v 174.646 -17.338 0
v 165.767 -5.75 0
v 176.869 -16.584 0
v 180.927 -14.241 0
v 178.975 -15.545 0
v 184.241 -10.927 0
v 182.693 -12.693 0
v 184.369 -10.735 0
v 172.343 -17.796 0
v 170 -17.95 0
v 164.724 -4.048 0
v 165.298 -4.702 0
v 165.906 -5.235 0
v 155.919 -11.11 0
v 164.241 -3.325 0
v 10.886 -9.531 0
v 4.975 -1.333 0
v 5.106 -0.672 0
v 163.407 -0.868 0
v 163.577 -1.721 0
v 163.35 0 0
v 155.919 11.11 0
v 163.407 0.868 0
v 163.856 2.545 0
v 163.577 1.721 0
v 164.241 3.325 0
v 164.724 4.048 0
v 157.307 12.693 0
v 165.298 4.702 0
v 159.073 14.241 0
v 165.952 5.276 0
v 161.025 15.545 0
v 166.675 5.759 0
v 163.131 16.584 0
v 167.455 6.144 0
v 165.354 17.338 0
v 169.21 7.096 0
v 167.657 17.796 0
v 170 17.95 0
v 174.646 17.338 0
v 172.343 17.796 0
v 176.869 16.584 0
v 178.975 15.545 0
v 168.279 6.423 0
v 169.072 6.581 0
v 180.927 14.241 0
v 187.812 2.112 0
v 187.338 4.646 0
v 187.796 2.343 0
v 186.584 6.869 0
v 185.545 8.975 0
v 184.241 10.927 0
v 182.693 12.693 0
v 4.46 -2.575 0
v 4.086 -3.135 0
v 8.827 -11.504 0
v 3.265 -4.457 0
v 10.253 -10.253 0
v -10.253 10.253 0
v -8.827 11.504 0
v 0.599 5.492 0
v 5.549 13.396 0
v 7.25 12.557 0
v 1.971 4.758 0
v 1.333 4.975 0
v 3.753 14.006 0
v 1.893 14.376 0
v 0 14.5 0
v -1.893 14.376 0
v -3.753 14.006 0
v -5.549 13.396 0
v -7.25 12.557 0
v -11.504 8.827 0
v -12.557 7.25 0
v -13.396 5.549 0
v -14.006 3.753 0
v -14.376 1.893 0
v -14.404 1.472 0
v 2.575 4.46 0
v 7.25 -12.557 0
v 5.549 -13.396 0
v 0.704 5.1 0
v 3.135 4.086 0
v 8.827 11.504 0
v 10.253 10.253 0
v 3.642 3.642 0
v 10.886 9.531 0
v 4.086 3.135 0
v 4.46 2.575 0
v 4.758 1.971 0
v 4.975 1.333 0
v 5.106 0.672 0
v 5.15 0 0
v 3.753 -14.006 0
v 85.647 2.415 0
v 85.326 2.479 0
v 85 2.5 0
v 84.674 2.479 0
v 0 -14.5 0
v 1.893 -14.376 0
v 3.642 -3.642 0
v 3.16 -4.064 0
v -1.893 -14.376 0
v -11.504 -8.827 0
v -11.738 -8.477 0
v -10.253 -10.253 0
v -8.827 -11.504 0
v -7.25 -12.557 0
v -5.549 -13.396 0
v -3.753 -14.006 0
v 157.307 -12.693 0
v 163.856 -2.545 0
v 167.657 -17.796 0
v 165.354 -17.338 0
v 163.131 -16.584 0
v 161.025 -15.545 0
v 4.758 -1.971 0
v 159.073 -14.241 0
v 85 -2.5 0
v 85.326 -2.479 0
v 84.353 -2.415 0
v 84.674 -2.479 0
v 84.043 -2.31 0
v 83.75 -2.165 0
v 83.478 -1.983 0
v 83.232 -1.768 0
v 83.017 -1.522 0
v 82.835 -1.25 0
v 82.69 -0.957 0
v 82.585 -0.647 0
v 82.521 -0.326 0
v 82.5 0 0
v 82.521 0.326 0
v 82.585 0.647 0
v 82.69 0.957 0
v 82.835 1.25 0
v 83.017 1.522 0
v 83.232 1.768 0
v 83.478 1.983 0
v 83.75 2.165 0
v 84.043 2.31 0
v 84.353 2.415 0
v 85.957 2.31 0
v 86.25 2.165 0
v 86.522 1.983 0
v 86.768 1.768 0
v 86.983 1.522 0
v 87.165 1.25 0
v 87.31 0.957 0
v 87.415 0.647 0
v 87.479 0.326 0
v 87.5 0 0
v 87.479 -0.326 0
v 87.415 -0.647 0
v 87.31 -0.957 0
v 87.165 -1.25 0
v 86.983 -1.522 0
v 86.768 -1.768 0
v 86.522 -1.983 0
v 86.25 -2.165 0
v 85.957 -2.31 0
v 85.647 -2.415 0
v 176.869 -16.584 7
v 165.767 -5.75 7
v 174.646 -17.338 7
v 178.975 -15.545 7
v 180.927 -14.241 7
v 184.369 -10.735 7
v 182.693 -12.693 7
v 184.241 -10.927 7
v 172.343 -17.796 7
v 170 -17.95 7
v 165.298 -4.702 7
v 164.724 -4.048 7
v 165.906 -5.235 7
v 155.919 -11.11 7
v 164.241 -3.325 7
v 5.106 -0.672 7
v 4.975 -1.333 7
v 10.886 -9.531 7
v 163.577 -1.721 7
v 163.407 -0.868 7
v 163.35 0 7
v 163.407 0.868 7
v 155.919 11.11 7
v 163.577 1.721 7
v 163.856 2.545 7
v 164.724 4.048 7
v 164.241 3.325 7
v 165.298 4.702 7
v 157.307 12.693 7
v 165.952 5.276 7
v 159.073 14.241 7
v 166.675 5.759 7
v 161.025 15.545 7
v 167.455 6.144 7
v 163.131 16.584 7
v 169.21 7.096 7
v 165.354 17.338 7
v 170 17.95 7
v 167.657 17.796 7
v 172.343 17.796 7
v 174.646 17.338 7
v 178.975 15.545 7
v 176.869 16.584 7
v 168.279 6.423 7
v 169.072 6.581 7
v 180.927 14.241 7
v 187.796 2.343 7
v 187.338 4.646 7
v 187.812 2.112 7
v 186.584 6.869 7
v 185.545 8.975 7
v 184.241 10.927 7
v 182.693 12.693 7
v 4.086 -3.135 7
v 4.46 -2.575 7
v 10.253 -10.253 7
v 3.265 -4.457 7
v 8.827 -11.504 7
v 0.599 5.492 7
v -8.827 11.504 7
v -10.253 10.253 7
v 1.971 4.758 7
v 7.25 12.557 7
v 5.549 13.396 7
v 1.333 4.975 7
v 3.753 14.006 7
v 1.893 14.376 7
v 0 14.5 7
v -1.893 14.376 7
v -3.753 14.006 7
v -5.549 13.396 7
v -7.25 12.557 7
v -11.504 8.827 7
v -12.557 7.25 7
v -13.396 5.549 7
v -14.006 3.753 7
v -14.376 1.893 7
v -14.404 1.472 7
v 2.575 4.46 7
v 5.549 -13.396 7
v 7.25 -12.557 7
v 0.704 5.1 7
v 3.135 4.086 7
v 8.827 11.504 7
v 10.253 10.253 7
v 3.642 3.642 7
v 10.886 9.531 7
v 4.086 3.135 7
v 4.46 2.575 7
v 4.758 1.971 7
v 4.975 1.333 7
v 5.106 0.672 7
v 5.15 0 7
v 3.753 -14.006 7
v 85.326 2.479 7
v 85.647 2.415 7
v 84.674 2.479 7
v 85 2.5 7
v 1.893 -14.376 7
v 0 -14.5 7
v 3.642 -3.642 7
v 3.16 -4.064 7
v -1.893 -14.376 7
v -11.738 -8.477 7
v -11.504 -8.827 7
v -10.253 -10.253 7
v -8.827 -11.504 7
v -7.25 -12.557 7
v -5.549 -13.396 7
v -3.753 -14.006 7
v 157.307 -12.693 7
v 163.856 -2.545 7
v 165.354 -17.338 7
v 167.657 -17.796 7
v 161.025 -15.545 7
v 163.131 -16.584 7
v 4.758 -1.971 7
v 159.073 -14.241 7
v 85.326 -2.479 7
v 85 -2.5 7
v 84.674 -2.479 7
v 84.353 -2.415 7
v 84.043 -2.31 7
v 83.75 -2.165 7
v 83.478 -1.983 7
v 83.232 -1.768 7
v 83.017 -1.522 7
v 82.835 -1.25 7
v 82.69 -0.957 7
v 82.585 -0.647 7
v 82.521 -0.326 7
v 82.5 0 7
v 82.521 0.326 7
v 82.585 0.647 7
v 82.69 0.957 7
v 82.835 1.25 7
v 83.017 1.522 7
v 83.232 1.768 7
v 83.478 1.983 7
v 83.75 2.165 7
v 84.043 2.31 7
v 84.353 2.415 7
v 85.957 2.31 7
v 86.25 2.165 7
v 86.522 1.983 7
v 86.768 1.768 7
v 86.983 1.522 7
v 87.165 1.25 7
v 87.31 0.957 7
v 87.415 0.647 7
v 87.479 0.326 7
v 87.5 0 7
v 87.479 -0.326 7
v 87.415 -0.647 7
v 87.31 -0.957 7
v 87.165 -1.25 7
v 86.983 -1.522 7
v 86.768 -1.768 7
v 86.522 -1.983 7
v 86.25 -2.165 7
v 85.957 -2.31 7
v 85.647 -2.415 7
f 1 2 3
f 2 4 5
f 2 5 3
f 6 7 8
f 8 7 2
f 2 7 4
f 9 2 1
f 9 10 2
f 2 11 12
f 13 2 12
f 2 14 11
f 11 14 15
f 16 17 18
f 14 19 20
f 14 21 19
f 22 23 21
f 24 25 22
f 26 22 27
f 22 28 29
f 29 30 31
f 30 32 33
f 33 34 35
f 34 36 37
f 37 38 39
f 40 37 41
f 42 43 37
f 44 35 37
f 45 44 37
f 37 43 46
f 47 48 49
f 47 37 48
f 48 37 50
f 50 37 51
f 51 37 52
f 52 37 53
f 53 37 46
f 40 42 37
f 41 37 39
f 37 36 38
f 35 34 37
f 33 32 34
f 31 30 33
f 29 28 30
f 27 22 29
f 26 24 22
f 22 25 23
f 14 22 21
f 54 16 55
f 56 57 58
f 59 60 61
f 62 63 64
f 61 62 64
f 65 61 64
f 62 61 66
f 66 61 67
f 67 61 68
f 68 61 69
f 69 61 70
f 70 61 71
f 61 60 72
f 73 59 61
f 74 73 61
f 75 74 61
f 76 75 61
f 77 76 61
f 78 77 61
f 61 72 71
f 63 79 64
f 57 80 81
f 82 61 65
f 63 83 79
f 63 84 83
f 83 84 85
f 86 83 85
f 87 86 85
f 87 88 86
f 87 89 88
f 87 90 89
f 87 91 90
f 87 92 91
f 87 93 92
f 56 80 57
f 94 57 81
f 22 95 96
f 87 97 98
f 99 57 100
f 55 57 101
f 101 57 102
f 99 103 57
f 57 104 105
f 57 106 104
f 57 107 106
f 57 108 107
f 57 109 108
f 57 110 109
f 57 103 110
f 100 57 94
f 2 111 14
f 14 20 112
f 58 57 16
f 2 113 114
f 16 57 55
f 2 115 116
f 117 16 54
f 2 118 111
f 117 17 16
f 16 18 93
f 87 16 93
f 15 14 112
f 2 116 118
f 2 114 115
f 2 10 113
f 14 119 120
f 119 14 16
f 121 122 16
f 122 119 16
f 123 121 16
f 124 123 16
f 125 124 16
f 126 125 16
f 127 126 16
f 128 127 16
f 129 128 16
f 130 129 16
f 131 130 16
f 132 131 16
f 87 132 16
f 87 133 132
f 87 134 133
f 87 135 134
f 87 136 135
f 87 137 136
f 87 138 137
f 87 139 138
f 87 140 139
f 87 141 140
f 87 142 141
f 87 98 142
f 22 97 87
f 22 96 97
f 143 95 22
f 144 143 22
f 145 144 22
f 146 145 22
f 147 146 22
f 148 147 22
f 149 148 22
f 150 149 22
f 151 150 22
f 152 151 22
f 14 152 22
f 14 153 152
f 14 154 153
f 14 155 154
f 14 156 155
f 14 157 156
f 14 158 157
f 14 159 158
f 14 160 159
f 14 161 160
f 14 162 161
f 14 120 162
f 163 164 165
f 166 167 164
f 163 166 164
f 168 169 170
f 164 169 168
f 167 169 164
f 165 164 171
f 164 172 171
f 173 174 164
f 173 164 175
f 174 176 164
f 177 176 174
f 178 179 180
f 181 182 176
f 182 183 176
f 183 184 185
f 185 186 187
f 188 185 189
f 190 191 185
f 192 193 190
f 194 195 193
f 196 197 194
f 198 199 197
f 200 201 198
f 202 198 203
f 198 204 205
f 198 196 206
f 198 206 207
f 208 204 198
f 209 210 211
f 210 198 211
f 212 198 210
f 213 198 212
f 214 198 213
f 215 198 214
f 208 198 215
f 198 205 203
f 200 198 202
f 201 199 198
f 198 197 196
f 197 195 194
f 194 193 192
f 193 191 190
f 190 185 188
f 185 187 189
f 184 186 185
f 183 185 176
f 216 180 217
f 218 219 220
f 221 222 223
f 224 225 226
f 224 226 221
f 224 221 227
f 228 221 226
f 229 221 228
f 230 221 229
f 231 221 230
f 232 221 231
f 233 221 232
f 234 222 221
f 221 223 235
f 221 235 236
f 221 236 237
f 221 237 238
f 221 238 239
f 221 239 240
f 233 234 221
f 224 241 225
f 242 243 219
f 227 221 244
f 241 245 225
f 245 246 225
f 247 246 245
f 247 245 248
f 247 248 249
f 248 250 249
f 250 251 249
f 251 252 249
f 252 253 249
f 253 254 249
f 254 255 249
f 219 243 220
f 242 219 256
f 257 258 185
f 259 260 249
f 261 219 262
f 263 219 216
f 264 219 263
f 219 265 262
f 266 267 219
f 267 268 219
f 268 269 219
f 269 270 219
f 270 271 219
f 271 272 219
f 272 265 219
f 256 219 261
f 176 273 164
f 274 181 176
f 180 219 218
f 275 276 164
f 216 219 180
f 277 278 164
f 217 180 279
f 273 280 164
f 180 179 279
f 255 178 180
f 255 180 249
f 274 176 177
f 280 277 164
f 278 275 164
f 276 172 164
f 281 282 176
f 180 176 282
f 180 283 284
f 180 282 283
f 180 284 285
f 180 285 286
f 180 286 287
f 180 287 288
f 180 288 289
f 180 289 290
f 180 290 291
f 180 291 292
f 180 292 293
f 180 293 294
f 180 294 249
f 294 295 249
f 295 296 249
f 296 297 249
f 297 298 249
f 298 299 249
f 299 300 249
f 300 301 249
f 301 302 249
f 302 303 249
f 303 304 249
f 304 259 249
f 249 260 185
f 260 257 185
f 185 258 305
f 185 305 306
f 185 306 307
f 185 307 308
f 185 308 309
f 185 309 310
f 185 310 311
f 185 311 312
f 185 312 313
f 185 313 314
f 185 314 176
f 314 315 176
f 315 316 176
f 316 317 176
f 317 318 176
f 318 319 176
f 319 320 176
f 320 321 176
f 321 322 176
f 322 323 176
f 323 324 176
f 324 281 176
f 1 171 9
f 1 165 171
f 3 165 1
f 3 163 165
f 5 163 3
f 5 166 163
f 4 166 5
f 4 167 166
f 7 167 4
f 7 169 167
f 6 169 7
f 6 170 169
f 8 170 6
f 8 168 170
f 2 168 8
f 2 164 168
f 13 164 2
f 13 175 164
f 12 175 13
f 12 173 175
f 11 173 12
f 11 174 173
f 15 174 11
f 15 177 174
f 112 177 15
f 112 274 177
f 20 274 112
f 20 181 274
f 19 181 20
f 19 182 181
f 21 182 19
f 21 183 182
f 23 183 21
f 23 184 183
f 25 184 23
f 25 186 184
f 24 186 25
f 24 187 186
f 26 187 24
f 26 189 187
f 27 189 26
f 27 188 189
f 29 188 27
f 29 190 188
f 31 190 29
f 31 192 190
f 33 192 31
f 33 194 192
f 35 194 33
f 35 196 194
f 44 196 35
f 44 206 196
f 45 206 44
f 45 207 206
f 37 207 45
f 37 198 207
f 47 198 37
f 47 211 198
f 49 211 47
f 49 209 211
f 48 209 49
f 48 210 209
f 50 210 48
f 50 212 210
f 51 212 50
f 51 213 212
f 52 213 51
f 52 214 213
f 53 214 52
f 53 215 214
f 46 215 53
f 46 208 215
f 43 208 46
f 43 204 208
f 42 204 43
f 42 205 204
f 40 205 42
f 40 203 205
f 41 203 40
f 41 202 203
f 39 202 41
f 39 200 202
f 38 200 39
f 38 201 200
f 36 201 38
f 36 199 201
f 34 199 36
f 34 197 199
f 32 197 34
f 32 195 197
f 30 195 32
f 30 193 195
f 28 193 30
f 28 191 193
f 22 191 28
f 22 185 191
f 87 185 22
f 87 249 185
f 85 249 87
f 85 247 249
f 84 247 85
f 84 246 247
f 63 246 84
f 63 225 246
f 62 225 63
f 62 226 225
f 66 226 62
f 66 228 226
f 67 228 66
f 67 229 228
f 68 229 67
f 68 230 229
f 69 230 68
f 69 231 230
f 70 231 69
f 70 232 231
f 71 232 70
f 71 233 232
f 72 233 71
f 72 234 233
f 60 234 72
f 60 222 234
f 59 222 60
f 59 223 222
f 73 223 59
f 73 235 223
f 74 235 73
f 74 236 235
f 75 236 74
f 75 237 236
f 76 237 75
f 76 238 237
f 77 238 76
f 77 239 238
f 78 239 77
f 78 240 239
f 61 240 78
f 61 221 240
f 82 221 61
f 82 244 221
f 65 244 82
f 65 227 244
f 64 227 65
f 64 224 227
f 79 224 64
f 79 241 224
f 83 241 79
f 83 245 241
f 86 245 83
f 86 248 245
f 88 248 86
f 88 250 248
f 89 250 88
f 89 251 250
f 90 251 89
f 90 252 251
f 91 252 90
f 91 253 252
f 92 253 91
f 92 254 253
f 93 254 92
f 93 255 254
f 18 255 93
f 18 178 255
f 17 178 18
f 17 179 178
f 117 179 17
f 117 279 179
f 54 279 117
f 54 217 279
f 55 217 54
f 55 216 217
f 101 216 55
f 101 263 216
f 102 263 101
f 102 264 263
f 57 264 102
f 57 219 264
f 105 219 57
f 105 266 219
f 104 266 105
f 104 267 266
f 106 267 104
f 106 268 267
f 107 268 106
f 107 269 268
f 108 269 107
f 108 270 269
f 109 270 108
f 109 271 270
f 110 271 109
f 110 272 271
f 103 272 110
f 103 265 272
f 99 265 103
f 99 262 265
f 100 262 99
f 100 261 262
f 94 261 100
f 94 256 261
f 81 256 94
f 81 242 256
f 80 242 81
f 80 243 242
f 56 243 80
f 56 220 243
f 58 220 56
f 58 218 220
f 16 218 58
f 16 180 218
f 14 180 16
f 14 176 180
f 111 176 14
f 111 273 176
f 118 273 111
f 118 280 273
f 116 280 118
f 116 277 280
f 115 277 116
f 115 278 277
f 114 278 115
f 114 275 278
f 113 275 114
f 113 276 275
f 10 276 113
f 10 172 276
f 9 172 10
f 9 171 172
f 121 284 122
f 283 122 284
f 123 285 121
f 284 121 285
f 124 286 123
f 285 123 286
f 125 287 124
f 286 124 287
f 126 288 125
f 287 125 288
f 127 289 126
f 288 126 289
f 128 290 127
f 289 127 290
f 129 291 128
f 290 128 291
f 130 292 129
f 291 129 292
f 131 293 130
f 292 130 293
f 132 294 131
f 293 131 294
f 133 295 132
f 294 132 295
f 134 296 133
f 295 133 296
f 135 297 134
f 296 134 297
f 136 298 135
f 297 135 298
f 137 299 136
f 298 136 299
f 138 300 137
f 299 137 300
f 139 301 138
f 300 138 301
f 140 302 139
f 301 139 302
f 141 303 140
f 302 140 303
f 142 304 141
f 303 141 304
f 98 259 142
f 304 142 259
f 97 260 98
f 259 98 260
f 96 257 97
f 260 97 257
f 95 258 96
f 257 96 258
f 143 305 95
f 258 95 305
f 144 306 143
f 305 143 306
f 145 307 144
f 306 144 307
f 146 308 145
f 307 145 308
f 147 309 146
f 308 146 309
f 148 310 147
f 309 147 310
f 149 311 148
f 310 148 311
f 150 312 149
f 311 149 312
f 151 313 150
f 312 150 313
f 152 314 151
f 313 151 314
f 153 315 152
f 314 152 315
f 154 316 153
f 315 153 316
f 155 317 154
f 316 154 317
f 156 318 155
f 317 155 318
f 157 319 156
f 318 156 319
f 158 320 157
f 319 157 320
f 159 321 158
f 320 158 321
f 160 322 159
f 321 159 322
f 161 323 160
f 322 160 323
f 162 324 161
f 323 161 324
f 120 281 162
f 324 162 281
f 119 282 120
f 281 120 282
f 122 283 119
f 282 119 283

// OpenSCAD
// @title Open-End Wrench (double ended)
// @category Hand Tools
// @material PETG, Nylon or PC; 100% infill
// @print 100% infill, flat on bed, no supports
// @summary Double open-end spanner, 15 degree offset jaws. Printed wrenches are for light/moderate torque - bike racks, cart axles, furniture, stuck plumbing fittings.
// @use Snug the jaws fully onto the flats before turning. If the plastic flexes, stop - use a longer lever on a metal tool instead.
// @variant 8-10mm | -D s1=8 -D s2=10
// @variant 10-13mm | -D s1=10 -D s2=13
// @variant 13-17mm | -D s1=13 -D s2=17
// @variant 17-19mm | -D s1=17 -D s2=19

s1 = 10; s2 = 13; thick = 7;
$fn = 48;
len = 5*(s1+s2) + 55;

// jaw opening for an s-mm nut, pointing along angle a
module jaw(s, a) {
  rotate(a) union() {
    translate([-s*0.2, -(s+0.3)/2]) square([s*3, s+0.3]);
    circle(d=s+0.3);
  }
}
linear_extrude(thick) difference() {
  union() {
    circle(d=s1*2.3+6);
    translate([len,0]) circle(d=s2*2.3+6);
    hull() {
      translate([s1*0.8,0]) circle(d=s1*1.1+8);
      translate([len-s2*0.8,0]) circle(d=s2*1.1+8);
    }
  }
  jaw(s1, 180+15);                    // opens away from the handle, 15 deg offset
  translate([len,0]) jaw(s2, -15);
  translate([len/2,0]) circle(d=5);   // hang hole
}
